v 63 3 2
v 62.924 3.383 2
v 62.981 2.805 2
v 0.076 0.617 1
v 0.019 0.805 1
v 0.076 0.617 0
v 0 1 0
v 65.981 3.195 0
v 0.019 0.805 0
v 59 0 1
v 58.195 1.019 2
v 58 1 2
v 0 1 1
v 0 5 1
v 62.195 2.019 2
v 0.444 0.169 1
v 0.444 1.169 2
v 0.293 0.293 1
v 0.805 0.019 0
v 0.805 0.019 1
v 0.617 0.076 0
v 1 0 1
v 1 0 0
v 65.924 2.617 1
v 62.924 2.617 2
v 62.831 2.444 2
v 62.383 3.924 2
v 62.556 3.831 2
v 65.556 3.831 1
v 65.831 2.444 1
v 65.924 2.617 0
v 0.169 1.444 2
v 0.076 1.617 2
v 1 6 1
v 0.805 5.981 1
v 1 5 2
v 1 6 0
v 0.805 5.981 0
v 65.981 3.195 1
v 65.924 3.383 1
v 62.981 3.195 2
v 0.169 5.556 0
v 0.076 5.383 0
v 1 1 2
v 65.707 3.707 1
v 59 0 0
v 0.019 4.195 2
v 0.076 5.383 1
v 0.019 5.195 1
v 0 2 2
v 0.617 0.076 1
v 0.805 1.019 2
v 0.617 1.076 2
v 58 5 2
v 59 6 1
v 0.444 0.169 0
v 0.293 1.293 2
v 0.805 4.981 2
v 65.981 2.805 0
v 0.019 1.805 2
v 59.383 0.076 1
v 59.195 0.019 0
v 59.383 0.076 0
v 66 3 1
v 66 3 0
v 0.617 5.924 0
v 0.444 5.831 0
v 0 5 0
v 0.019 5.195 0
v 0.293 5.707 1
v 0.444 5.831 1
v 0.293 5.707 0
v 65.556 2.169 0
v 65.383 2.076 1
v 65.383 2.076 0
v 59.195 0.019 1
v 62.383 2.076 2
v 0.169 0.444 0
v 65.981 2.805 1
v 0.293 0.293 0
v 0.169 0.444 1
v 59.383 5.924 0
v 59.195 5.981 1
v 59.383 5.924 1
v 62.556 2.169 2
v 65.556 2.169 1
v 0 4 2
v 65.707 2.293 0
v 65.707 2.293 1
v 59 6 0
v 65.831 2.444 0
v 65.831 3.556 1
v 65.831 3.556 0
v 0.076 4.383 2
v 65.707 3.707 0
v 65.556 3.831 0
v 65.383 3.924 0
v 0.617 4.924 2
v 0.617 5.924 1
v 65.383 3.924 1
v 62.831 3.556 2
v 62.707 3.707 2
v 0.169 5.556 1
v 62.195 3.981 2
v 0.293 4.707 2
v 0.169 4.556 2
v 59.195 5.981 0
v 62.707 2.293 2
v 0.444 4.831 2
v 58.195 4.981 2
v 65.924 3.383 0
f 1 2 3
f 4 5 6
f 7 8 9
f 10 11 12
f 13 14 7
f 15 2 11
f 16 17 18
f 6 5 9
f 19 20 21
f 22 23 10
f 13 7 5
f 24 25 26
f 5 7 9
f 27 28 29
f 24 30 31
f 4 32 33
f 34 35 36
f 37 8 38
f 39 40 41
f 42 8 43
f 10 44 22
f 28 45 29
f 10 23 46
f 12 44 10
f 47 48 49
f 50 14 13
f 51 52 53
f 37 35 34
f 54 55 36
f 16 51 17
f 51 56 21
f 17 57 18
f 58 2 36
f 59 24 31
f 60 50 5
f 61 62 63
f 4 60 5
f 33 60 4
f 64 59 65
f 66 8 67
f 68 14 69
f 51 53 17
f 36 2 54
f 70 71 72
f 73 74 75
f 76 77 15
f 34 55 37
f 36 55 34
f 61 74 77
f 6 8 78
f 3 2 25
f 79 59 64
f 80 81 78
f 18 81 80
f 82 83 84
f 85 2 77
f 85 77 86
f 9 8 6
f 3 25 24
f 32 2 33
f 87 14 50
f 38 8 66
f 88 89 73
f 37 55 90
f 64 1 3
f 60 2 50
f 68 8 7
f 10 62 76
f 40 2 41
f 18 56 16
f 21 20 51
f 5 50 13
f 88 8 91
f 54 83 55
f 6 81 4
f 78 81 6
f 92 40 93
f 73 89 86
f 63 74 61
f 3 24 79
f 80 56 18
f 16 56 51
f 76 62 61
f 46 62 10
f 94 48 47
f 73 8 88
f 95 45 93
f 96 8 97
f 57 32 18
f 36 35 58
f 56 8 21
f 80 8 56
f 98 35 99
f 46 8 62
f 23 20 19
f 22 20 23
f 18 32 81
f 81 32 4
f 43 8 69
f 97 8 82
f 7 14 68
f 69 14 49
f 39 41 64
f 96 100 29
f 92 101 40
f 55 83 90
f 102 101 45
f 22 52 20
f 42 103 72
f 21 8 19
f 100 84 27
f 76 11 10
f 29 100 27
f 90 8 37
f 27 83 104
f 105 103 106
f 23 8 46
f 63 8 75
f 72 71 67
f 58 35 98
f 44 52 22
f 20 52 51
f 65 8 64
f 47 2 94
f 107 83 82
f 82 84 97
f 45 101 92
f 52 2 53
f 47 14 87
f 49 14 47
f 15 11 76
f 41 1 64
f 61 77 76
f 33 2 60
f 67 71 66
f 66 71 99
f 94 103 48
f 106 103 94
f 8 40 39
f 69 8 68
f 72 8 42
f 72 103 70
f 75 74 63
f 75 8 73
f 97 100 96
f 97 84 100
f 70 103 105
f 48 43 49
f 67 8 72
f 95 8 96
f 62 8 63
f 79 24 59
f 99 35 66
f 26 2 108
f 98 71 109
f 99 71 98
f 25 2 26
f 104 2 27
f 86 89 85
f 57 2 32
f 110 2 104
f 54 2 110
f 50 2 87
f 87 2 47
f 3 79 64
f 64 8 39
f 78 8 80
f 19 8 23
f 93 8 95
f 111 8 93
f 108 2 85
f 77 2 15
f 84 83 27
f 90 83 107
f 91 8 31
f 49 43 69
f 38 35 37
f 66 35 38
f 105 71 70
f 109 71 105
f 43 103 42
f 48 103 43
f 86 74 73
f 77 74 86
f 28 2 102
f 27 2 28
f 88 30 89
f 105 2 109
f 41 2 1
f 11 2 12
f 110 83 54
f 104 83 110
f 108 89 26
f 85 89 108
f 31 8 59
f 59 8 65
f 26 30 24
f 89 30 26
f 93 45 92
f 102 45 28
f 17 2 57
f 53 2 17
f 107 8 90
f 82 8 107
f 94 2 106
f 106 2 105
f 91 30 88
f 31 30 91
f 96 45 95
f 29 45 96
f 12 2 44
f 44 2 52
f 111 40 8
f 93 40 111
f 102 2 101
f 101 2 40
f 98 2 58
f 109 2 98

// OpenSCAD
$fn = 32;
step=1;

lengde = 60;
bredde = 6;
avrunding = 1;

module pil(lengde = 60, bredde = 6, avrunding = 1) {
    hull() {
        translate([avrunding,avrunding]) {
            circle(r=avrunding);
        }
        translate([avrunding,bredde-avrunding]) {
            circle(r=avrunding);
        }
        translate([lengde-avrunding,avrunding]) {
            circle(r=avrunding);
        }
        translate([lengde-avrunding+bredde, bredde/2]) {
            circle(r=avrunding);
        }
        translate([lengde-avrunding,bredde-avrunding]) {
            circle(r=avrunding);
        }
    }
}

hull() {
    linear_extrude(step) {
        pil(lengde = lengde, bredde = bredde, avrunding = avrunding);
    }
    translate([0,step,step]) {
        linear_extrude(1) {
            pil(lengde = lengde-step, bredde = bredde-step*2, avrunding = avrunding);
        }
    }
}
